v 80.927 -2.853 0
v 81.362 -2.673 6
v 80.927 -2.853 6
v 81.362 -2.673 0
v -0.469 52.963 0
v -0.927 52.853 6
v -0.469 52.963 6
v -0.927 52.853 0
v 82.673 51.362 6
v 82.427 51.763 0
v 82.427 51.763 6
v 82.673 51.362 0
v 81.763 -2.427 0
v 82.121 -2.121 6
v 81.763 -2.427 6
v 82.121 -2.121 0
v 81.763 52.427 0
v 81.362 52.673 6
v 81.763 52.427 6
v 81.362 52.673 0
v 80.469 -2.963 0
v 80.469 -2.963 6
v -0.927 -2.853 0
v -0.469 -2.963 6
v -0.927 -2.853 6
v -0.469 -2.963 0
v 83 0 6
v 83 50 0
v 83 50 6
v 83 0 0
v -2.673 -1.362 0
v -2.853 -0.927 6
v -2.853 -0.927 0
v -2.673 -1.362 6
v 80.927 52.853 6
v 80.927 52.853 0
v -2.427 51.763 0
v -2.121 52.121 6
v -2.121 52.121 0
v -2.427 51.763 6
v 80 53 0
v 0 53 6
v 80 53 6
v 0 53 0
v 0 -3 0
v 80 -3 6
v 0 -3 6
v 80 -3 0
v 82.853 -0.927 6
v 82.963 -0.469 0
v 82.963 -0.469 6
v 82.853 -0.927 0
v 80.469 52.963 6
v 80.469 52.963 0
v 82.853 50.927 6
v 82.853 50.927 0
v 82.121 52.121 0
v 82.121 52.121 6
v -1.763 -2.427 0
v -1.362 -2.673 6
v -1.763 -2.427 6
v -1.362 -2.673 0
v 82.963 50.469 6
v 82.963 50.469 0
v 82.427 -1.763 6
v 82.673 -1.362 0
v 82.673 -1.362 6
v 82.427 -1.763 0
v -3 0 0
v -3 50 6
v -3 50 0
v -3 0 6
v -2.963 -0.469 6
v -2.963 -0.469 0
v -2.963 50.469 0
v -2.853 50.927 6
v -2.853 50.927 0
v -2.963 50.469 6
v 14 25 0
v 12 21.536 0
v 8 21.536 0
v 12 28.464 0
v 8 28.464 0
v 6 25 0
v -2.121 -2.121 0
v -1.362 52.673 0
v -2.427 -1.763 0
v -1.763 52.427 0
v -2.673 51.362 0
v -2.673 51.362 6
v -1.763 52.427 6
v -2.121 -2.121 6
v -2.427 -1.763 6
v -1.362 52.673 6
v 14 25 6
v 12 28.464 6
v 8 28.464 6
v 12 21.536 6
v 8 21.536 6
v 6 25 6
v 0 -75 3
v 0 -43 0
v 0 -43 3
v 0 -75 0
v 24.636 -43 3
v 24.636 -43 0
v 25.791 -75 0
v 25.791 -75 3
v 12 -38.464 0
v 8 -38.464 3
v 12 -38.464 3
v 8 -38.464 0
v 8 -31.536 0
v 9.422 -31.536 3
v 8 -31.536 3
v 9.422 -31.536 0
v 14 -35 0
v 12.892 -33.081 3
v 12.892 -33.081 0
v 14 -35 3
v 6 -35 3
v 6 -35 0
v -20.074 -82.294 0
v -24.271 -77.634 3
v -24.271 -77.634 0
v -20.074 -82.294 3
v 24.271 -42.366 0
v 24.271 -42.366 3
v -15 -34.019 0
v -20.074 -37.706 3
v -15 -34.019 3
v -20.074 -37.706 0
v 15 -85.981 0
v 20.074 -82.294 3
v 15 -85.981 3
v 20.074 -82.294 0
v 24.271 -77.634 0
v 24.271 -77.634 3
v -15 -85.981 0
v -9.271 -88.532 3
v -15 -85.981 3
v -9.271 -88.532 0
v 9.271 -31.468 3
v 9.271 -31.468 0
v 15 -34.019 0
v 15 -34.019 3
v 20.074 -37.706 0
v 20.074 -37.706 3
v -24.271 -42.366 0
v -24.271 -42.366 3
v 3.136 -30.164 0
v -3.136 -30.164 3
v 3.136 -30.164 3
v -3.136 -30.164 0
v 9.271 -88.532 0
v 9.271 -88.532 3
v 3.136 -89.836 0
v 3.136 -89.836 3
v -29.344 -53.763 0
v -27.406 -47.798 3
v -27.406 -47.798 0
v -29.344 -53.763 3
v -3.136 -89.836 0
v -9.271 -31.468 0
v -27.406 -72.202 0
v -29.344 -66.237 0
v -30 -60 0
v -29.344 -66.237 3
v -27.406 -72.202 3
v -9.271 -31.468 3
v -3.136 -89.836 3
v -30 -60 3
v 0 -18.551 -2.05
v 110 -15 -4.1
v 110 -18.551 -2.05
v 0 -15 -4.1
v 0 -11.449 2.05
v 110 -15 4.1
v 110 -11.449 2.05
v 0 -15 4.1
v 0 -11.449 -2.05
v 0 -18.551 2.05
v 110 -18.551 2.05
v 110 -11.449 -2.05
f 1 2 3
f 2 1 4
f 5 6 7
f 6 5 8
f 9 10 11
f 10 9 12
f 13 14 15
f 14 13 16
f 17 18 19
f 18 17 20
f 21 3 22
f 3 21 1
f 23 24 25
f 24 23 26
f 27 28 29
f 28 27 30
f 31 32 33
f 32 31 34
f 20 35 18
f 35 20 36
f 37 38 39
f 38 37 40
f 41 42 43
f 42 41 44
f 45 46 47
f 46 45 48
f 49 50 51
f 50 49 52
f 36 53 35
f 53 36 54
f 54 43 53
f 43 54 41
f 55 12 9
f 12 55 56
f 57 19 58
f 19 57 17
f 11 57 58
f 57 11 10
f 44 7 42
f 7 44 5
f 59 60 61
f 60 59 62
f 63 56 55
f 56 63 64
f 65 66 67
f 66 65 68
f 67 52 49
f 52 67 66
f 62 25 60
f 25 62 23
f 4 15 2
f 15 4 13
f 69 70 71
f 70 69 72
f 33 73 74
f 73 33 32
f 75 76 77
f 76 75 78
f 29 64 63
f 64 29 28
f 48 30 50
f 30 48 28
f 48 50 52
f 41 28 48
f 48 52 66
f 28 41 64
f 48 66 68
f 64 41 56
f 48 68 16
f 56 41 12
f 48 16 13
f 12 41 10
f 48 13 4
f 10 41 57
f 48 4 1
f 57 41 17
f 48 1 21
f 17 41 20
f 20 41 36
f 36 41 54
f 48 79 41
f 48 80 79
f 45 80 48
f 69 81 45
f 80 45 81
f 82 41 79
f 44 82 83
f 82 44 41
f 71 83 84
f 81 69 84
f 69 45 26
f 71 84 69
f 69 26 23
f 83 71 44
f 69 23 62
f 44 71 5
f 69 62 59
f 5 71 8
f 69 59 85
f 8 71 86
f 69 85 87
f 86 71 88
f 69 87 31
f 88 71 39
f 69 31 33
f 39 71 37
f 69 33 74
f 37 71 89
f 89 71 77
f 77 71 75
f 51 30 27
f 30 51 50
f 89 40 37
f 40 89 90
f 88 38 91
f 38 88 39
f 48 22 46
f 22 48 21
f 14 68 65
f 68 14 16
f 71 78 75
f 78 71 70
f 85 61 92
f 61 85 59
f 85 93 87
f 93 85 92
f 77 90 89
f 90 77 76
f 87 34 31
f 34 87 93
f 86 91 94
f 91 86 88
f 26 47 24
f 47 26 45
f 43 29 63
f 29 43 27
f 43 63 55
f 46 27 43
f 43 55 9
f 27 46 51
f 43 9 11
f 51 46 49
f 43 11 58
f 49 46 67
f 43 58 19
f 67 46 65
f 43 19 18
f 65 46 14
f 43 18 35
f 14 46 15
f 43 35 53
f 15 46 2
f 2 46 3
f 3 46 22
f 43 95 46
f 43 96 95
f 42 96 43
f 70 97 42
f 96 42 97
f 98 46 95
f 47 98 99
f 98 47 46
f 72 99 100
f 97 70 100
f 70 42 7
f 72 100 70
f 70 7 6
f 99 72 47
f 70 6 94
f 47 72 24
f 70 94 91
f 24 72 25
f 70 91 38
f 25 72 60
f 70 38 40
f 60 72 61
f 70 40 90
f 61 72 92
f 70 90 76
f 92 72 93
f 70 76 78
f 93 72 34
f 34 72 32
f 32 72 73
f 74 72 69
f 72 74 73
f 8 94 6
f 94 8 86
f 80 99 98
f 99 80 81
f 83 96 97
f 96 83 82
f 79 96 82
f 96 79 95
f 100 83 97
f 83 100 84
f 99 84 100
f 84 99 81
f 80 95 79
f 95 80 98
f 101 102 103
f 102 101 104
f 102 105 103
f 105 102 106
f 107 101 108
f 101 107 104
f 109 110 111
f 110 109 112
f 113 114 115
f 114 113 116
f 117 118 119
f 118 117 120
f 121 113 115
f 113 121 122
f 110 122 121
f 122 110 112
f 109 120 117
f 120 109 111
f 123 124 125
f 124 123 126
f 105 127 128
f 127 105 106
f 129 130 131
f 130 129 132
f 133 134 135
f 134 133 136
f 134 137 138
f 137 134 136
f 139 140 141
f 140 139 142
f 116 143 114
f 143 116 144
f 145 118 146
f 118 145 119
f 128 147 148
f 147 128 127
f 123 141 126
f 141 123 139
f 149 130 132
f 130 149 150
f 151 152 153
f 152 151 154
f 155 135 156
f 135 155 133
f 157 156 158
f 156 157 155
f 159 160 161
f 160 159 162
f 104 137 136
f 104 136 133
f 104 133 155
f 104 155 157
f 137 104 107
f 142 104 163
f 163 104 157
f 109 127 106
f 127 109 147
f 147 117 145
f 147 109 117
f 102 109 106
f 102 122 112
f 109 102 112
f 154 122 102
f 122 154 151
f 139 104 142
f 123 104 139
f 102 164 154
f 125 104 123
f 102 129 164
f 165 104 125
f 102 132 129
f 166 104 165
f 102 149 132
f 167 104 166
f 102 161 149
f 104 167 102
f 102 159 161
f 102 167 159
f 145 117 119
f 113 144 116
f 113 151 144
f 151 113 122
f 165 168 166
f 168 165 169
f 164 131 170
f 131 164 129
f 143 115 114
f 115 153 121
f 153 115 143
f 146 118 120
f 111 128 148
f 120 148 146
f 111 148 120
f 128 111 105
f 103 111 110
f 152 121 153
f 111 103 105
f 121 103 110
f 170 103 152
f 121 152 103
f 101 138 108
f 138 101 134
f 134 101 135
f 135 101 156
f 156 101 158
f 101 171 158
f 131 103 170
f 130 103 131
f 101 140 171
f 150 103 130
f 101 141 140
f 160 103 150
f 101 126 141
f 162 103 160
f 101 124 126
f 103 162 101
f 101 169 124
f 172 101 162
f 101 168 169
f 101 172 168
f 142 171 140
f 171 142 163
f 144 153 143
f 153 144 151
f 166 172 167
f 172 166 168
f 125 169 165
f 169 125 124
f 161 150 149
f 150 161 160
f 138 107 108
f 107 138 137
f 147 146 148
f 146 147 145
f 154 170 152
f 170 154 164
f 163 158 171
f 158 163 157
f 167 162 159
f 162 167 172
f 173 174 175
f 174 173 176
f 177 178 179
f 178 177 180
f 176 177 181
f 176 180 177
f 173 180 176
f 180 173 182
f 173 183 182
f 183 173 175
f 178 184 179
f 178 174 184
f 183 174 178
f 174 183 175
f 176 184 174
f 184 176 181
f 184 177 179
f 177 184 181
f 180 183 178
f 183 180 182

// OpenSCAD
module the_diff() {
     translate([10,25,-10]) {
          cylinder(h=20, r=4, $fn=6);
     }
}

difference() {
     minkowski() {
          cube([80, 50, 5]);
          cylinder(r=3, $fn=40);
     }
     the_diff();
}

translate([0, -15, 0]) {
     rotate([0,90,0]) {
          cylinder(h=110, r=4.1, $fn=6);
     }
}

translate([0, -60, 0]) {
     difference() {
          cylinder(h=3, r=30);
          union() {
               translate([0, -15, -5]) {
                    cube(32);
               }
               translate([0,
                           0, 0]) {
                    the_diff();
               }
          }
     }
}
